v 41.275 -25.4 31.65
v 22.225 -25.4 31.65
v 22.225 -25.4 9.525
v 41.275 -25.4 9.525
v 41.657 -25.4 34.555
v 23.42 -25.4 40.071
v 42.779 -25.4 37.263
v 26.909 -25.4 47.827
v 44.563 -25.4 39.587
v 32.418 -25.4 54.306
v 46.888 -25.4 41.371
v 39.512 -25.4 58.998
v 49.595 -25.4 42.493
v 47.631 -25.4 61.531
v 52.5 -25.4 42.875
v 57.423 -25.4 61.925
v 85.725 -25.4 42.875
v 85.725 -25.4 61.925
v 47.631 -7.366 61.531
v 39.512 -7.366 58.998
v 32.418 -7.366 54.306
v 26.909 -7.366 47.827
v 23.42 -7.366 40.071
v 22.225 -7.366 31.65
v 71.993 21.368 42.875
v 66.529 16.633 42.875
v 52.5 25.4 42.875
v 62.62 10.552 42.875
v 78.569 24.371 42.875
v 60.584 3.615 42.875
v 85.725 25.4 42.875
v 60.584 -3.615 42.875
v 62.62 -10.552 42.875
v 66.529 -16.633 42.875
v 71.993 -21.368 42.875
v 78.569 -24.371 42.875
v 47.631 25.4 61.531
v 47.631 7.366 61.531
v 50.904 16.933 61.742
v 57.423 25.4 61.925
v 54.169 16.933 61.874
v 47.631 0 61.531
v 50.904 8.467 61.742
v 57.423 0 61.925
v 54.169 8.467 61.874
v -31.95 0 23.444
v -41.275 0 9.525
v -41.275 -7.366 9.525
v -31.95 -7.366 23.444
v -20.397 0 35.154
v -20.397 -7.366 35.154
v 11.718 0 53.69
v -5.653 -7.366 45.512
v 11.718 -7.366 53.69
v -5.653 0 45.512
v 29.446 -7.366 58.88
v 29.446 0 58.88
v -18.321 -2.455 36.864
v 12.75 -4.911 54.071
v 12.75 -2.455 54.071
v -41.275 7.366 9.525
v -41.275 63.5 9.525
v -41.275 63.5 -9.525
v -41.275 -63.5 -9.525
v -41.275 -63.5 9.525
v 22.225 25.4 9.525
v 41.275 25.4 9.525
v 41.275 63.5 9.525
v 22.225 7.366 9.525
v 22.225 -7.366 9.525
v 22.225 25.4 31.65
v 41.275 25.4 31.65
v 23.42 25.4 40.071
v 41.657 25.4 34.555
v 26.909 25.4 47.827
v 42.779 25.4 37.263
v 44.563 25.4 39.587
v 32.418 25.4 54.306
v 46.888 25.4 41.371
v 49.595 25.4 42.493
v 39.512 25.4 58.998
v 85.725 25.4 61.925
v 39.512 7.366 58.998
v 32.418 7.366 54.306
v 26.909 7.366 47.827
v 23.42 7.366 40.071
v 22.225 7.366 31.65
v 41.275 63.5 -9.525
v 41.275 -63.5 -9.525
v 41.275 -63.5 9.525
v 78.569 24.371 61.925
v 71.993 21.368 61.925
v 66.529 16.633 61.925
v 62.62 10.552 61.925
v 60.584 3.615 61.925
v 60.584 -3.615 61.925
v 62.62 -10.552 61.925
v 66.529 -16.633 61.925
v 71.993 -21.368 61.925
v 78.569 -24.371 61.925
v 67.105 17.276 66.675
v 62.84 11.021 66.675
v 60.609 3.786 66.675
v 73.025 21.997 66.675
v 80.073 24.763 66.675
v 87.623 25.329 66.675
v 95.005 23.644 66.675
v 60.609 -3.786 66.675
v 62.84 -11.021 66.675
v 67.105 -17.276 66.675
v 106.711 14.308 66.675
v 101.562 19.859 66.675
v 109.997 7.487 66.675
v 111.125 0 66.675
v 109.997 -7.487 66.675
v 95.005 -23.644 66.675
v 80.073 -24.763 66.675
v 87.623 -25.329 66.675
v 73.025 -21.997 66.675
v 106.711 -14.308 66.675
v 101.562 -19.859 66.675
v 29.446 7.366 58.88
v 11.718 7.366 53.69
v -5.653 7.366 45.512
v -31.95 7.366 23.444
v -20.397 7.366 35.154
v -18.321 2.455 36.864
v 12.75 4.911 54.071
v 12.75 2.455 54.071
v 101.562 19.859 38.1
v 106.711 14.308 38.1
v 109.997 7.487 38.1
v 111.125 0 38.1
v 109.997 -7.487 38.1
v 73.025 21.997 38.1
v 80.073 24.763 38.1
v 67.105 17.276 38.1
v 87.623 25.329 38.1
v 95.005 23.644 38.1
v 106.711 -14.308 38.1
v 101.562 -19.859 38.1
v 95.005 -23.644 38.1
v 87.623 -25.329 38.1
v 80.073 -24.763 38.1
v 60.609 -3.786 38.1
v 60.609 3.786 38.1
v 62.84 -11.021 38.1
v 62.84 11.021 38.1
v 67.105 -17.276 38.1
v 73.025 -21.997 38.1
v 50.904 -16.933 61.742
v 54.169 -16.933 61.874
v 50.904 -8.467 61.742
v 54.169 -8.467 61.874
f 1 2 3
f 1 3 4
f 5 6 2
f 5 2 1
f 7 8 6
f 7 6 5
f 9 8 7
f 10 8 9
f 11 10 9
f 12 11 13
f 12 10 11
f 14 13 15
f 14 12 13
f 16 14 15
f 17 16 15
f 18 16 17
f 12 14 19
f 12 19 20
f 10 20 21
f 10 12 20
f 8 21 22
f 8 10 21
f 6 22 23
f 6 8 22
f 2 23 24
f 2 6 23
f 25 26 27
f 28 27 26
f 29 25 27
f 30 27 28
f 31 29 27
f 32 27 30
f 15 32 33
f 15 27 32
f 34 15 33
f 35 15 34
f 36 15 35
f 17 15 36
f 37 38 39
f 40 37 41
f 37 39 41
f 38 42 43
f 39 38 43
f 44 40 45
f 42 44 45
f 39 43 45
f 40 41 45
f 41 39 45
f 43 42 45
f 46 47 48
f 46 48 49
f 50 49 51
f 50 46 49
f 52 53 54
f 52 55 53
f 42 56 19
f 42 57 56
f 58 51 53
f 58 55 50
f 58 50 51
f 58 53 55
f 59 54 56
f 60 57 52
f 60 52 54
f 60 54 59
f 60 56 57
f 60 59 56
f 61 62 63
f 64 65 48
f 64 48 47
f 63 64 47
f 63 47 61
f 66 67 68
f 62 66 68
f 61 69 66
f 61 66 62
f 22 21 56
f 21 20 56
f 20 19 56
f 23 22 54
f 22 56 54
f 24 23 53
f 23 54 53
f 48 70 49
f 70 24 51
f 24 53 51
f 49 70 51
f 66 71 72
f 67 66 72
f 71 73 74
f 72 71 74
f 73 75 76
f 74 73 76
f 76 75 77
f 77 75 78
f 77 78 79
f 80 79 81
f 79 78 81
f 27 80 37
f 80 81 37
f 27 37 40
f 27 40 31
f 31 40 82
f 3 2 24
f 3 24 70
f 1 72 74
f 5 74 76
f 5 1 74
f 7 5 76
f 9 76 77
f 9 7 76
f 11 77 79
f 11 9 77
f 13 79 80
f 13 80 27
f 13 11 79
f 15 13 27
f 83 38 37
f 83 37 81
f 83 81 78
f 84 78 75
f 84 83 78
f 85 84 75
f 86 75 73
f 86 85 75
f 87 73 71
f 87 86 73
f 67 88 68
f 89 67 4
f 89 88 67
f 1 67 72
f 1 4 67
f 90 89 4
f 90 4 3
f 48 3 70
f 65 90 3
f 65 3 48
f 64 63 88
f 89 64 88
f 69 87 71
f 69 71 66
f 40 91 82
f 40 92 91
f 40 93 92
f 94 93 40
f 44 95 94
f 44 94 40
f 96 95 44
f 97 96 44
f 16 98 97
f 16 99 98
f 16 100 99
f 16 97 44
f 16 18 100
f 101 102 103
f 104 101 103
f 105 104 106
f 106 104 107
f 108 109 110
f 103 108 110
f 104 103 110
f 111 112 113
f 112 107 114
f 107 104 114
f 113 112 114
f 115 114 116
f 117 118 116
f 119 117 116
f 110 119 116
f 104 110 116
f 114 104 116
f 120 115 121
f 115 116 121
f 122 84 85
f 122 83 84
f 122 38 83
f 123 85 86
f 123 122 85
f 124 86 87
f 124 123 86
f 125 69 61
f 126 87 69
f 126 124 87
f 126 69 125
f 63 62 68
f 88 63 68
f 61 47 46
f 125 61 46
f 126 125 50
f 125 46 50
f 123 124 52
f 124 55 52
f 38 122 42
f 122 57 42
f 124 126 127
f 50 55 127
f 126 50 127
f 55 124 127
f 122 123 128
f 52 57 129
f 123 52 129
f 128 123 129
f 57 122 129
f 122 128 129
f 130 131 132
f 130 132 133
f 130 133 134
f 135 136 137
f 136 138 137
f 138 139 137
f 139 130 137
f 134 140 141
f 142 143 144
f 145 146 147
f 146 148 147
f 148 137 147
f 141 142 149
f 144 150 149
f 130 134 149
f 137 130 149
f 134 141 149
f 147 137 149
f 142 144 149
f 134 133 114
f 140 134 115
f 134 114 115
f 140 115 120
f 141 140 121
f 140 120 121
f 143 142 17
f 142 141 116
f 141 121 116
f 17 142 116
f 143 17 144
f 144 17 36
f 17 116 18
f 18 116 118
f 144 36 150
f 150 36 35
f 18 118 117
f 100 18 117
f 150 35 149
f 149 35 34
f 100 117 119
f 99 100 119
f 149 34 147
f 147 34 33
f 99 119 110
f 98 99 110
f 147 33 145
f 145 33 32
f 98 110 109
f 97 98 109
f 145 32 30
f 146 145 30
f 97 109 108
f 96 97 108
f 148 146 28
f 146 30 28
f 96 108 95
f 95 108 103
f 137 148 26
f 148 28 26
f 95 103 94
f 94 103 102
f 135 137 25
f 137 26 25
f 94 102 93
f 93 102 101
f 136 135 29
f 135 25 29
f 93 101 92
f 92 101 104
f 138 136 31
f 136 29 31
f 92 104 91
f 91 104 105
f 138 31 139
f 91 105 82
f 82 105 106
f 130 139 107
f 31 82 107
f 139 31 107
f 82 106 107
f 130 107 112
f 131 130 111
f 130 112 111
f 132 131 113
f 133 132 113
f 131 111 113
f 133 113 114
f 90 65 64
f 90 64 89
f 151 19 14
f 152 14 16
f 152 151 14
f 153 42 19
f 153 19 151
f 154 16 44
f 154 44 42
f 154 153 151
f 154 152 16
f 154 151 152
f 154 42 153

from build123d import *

# Parameters (mm, degrees)
F1_DEPTH = 63.5
F0_W     = 25.4
F0_H     = 19.05
F2_DEPTH = 25.4
F3_DEPTH = 7.366


with BuildPart() as f1:
    # F0 (on Front) → F1 (new body, symmetric)
    with BuildSketch(Plane.XZ):
        Polygon((22.225, 9.525), (-41.275, 9.525), (-41.275, -9.525), (41.275, -9.525), (41.275, 9.525), align=None)
    extrude(amount=F1_DEPTH, both=True)

    # F0 (on Front) → F2 (join, symmetric)
    with BuildSketch(Plane.XZ):
        with BuildLine():
            Line((22.225, 31.6498798487), (22.225, 9.525))
            Line((22.225, 9.525), (41.275, 9.525))
            Line((41.275, 9.525), (41.275, 31.6498798487))
            ThreePointArc((41.275, 31.6498798487), (44.5628201513, 39.5873798487), (52.5003201513, 42.8752))
            Line((52.5003201513, 42.8752), (60.325, 42.8752))
            Line((60.325, 42.8752), (60.325, 61.9252))
            Line((60.325, 61.9252), (57.422989761, 61.9252))
            add(Edge.make_bspline(
                [(47.6310352759, 61.5310624736), (50.9065534115, 61.7825559935), (54.1756772535, 61.9134758207), (57.422989761, 61.9252)],
                knots=[102.2694518038, 102.2694518038, 102.2694518038, 102.2694518038, 111.7455777331, 111.7455777331, 111.7455777331, 111.7455777331], degree=3))
            ThreePointArc((47.6310352759, 61.5310624736), (29.4350413889, 51.2607932868), (22.225, 31.6498798487))
        make_face()
        with Locations((73.025, 52.4002)):
            Rectangle(F0_W, F0_H)
    extrude(amount=F2_DEPTH, both=True)

    # F0 (on Front) → F3 (join, symmetric)
    with BuildSketch(Plane.XZ):
        with BuildLine():
            add(Edge.make_bspline(
                [(-41.275, 9.525), (-23.8146628268, 42.0589220726), (12.2805717425, 58.8168621141), (47.6310352759, 61.5310624736)],
                knots=[0, 0, 0, 0, 102.2694518038, 102.2694518038, 102.2694518038, 102.2694518038], degree=3))
            Line((-41.275, 9.525), (22.225, 9.525))
            Line((22.225, 9.525), (22.225, 31.6498798487))
            ThreePointArc((22.225, 31.6498798487), (29.4350413889, 51.2607932868), (47.6310352759, 61.5310624736))
        make_face()
    extrude(amount=F3_DEPTH, both=True)

    # F0 (on Front) → F4 (revolve)
    with BuildSketch(Plane.XZ):
        Polygon((85.725, 66.675), (85.725, 61.9252), (85.725, 42.8752), (85.725, 38.1), (111.125, 38.1), (111.125, 66.675), align=None)
    revolve(axis=Axis((85.725, 0, 52.3875), (0, 0, -1)))


solid = f1.part
